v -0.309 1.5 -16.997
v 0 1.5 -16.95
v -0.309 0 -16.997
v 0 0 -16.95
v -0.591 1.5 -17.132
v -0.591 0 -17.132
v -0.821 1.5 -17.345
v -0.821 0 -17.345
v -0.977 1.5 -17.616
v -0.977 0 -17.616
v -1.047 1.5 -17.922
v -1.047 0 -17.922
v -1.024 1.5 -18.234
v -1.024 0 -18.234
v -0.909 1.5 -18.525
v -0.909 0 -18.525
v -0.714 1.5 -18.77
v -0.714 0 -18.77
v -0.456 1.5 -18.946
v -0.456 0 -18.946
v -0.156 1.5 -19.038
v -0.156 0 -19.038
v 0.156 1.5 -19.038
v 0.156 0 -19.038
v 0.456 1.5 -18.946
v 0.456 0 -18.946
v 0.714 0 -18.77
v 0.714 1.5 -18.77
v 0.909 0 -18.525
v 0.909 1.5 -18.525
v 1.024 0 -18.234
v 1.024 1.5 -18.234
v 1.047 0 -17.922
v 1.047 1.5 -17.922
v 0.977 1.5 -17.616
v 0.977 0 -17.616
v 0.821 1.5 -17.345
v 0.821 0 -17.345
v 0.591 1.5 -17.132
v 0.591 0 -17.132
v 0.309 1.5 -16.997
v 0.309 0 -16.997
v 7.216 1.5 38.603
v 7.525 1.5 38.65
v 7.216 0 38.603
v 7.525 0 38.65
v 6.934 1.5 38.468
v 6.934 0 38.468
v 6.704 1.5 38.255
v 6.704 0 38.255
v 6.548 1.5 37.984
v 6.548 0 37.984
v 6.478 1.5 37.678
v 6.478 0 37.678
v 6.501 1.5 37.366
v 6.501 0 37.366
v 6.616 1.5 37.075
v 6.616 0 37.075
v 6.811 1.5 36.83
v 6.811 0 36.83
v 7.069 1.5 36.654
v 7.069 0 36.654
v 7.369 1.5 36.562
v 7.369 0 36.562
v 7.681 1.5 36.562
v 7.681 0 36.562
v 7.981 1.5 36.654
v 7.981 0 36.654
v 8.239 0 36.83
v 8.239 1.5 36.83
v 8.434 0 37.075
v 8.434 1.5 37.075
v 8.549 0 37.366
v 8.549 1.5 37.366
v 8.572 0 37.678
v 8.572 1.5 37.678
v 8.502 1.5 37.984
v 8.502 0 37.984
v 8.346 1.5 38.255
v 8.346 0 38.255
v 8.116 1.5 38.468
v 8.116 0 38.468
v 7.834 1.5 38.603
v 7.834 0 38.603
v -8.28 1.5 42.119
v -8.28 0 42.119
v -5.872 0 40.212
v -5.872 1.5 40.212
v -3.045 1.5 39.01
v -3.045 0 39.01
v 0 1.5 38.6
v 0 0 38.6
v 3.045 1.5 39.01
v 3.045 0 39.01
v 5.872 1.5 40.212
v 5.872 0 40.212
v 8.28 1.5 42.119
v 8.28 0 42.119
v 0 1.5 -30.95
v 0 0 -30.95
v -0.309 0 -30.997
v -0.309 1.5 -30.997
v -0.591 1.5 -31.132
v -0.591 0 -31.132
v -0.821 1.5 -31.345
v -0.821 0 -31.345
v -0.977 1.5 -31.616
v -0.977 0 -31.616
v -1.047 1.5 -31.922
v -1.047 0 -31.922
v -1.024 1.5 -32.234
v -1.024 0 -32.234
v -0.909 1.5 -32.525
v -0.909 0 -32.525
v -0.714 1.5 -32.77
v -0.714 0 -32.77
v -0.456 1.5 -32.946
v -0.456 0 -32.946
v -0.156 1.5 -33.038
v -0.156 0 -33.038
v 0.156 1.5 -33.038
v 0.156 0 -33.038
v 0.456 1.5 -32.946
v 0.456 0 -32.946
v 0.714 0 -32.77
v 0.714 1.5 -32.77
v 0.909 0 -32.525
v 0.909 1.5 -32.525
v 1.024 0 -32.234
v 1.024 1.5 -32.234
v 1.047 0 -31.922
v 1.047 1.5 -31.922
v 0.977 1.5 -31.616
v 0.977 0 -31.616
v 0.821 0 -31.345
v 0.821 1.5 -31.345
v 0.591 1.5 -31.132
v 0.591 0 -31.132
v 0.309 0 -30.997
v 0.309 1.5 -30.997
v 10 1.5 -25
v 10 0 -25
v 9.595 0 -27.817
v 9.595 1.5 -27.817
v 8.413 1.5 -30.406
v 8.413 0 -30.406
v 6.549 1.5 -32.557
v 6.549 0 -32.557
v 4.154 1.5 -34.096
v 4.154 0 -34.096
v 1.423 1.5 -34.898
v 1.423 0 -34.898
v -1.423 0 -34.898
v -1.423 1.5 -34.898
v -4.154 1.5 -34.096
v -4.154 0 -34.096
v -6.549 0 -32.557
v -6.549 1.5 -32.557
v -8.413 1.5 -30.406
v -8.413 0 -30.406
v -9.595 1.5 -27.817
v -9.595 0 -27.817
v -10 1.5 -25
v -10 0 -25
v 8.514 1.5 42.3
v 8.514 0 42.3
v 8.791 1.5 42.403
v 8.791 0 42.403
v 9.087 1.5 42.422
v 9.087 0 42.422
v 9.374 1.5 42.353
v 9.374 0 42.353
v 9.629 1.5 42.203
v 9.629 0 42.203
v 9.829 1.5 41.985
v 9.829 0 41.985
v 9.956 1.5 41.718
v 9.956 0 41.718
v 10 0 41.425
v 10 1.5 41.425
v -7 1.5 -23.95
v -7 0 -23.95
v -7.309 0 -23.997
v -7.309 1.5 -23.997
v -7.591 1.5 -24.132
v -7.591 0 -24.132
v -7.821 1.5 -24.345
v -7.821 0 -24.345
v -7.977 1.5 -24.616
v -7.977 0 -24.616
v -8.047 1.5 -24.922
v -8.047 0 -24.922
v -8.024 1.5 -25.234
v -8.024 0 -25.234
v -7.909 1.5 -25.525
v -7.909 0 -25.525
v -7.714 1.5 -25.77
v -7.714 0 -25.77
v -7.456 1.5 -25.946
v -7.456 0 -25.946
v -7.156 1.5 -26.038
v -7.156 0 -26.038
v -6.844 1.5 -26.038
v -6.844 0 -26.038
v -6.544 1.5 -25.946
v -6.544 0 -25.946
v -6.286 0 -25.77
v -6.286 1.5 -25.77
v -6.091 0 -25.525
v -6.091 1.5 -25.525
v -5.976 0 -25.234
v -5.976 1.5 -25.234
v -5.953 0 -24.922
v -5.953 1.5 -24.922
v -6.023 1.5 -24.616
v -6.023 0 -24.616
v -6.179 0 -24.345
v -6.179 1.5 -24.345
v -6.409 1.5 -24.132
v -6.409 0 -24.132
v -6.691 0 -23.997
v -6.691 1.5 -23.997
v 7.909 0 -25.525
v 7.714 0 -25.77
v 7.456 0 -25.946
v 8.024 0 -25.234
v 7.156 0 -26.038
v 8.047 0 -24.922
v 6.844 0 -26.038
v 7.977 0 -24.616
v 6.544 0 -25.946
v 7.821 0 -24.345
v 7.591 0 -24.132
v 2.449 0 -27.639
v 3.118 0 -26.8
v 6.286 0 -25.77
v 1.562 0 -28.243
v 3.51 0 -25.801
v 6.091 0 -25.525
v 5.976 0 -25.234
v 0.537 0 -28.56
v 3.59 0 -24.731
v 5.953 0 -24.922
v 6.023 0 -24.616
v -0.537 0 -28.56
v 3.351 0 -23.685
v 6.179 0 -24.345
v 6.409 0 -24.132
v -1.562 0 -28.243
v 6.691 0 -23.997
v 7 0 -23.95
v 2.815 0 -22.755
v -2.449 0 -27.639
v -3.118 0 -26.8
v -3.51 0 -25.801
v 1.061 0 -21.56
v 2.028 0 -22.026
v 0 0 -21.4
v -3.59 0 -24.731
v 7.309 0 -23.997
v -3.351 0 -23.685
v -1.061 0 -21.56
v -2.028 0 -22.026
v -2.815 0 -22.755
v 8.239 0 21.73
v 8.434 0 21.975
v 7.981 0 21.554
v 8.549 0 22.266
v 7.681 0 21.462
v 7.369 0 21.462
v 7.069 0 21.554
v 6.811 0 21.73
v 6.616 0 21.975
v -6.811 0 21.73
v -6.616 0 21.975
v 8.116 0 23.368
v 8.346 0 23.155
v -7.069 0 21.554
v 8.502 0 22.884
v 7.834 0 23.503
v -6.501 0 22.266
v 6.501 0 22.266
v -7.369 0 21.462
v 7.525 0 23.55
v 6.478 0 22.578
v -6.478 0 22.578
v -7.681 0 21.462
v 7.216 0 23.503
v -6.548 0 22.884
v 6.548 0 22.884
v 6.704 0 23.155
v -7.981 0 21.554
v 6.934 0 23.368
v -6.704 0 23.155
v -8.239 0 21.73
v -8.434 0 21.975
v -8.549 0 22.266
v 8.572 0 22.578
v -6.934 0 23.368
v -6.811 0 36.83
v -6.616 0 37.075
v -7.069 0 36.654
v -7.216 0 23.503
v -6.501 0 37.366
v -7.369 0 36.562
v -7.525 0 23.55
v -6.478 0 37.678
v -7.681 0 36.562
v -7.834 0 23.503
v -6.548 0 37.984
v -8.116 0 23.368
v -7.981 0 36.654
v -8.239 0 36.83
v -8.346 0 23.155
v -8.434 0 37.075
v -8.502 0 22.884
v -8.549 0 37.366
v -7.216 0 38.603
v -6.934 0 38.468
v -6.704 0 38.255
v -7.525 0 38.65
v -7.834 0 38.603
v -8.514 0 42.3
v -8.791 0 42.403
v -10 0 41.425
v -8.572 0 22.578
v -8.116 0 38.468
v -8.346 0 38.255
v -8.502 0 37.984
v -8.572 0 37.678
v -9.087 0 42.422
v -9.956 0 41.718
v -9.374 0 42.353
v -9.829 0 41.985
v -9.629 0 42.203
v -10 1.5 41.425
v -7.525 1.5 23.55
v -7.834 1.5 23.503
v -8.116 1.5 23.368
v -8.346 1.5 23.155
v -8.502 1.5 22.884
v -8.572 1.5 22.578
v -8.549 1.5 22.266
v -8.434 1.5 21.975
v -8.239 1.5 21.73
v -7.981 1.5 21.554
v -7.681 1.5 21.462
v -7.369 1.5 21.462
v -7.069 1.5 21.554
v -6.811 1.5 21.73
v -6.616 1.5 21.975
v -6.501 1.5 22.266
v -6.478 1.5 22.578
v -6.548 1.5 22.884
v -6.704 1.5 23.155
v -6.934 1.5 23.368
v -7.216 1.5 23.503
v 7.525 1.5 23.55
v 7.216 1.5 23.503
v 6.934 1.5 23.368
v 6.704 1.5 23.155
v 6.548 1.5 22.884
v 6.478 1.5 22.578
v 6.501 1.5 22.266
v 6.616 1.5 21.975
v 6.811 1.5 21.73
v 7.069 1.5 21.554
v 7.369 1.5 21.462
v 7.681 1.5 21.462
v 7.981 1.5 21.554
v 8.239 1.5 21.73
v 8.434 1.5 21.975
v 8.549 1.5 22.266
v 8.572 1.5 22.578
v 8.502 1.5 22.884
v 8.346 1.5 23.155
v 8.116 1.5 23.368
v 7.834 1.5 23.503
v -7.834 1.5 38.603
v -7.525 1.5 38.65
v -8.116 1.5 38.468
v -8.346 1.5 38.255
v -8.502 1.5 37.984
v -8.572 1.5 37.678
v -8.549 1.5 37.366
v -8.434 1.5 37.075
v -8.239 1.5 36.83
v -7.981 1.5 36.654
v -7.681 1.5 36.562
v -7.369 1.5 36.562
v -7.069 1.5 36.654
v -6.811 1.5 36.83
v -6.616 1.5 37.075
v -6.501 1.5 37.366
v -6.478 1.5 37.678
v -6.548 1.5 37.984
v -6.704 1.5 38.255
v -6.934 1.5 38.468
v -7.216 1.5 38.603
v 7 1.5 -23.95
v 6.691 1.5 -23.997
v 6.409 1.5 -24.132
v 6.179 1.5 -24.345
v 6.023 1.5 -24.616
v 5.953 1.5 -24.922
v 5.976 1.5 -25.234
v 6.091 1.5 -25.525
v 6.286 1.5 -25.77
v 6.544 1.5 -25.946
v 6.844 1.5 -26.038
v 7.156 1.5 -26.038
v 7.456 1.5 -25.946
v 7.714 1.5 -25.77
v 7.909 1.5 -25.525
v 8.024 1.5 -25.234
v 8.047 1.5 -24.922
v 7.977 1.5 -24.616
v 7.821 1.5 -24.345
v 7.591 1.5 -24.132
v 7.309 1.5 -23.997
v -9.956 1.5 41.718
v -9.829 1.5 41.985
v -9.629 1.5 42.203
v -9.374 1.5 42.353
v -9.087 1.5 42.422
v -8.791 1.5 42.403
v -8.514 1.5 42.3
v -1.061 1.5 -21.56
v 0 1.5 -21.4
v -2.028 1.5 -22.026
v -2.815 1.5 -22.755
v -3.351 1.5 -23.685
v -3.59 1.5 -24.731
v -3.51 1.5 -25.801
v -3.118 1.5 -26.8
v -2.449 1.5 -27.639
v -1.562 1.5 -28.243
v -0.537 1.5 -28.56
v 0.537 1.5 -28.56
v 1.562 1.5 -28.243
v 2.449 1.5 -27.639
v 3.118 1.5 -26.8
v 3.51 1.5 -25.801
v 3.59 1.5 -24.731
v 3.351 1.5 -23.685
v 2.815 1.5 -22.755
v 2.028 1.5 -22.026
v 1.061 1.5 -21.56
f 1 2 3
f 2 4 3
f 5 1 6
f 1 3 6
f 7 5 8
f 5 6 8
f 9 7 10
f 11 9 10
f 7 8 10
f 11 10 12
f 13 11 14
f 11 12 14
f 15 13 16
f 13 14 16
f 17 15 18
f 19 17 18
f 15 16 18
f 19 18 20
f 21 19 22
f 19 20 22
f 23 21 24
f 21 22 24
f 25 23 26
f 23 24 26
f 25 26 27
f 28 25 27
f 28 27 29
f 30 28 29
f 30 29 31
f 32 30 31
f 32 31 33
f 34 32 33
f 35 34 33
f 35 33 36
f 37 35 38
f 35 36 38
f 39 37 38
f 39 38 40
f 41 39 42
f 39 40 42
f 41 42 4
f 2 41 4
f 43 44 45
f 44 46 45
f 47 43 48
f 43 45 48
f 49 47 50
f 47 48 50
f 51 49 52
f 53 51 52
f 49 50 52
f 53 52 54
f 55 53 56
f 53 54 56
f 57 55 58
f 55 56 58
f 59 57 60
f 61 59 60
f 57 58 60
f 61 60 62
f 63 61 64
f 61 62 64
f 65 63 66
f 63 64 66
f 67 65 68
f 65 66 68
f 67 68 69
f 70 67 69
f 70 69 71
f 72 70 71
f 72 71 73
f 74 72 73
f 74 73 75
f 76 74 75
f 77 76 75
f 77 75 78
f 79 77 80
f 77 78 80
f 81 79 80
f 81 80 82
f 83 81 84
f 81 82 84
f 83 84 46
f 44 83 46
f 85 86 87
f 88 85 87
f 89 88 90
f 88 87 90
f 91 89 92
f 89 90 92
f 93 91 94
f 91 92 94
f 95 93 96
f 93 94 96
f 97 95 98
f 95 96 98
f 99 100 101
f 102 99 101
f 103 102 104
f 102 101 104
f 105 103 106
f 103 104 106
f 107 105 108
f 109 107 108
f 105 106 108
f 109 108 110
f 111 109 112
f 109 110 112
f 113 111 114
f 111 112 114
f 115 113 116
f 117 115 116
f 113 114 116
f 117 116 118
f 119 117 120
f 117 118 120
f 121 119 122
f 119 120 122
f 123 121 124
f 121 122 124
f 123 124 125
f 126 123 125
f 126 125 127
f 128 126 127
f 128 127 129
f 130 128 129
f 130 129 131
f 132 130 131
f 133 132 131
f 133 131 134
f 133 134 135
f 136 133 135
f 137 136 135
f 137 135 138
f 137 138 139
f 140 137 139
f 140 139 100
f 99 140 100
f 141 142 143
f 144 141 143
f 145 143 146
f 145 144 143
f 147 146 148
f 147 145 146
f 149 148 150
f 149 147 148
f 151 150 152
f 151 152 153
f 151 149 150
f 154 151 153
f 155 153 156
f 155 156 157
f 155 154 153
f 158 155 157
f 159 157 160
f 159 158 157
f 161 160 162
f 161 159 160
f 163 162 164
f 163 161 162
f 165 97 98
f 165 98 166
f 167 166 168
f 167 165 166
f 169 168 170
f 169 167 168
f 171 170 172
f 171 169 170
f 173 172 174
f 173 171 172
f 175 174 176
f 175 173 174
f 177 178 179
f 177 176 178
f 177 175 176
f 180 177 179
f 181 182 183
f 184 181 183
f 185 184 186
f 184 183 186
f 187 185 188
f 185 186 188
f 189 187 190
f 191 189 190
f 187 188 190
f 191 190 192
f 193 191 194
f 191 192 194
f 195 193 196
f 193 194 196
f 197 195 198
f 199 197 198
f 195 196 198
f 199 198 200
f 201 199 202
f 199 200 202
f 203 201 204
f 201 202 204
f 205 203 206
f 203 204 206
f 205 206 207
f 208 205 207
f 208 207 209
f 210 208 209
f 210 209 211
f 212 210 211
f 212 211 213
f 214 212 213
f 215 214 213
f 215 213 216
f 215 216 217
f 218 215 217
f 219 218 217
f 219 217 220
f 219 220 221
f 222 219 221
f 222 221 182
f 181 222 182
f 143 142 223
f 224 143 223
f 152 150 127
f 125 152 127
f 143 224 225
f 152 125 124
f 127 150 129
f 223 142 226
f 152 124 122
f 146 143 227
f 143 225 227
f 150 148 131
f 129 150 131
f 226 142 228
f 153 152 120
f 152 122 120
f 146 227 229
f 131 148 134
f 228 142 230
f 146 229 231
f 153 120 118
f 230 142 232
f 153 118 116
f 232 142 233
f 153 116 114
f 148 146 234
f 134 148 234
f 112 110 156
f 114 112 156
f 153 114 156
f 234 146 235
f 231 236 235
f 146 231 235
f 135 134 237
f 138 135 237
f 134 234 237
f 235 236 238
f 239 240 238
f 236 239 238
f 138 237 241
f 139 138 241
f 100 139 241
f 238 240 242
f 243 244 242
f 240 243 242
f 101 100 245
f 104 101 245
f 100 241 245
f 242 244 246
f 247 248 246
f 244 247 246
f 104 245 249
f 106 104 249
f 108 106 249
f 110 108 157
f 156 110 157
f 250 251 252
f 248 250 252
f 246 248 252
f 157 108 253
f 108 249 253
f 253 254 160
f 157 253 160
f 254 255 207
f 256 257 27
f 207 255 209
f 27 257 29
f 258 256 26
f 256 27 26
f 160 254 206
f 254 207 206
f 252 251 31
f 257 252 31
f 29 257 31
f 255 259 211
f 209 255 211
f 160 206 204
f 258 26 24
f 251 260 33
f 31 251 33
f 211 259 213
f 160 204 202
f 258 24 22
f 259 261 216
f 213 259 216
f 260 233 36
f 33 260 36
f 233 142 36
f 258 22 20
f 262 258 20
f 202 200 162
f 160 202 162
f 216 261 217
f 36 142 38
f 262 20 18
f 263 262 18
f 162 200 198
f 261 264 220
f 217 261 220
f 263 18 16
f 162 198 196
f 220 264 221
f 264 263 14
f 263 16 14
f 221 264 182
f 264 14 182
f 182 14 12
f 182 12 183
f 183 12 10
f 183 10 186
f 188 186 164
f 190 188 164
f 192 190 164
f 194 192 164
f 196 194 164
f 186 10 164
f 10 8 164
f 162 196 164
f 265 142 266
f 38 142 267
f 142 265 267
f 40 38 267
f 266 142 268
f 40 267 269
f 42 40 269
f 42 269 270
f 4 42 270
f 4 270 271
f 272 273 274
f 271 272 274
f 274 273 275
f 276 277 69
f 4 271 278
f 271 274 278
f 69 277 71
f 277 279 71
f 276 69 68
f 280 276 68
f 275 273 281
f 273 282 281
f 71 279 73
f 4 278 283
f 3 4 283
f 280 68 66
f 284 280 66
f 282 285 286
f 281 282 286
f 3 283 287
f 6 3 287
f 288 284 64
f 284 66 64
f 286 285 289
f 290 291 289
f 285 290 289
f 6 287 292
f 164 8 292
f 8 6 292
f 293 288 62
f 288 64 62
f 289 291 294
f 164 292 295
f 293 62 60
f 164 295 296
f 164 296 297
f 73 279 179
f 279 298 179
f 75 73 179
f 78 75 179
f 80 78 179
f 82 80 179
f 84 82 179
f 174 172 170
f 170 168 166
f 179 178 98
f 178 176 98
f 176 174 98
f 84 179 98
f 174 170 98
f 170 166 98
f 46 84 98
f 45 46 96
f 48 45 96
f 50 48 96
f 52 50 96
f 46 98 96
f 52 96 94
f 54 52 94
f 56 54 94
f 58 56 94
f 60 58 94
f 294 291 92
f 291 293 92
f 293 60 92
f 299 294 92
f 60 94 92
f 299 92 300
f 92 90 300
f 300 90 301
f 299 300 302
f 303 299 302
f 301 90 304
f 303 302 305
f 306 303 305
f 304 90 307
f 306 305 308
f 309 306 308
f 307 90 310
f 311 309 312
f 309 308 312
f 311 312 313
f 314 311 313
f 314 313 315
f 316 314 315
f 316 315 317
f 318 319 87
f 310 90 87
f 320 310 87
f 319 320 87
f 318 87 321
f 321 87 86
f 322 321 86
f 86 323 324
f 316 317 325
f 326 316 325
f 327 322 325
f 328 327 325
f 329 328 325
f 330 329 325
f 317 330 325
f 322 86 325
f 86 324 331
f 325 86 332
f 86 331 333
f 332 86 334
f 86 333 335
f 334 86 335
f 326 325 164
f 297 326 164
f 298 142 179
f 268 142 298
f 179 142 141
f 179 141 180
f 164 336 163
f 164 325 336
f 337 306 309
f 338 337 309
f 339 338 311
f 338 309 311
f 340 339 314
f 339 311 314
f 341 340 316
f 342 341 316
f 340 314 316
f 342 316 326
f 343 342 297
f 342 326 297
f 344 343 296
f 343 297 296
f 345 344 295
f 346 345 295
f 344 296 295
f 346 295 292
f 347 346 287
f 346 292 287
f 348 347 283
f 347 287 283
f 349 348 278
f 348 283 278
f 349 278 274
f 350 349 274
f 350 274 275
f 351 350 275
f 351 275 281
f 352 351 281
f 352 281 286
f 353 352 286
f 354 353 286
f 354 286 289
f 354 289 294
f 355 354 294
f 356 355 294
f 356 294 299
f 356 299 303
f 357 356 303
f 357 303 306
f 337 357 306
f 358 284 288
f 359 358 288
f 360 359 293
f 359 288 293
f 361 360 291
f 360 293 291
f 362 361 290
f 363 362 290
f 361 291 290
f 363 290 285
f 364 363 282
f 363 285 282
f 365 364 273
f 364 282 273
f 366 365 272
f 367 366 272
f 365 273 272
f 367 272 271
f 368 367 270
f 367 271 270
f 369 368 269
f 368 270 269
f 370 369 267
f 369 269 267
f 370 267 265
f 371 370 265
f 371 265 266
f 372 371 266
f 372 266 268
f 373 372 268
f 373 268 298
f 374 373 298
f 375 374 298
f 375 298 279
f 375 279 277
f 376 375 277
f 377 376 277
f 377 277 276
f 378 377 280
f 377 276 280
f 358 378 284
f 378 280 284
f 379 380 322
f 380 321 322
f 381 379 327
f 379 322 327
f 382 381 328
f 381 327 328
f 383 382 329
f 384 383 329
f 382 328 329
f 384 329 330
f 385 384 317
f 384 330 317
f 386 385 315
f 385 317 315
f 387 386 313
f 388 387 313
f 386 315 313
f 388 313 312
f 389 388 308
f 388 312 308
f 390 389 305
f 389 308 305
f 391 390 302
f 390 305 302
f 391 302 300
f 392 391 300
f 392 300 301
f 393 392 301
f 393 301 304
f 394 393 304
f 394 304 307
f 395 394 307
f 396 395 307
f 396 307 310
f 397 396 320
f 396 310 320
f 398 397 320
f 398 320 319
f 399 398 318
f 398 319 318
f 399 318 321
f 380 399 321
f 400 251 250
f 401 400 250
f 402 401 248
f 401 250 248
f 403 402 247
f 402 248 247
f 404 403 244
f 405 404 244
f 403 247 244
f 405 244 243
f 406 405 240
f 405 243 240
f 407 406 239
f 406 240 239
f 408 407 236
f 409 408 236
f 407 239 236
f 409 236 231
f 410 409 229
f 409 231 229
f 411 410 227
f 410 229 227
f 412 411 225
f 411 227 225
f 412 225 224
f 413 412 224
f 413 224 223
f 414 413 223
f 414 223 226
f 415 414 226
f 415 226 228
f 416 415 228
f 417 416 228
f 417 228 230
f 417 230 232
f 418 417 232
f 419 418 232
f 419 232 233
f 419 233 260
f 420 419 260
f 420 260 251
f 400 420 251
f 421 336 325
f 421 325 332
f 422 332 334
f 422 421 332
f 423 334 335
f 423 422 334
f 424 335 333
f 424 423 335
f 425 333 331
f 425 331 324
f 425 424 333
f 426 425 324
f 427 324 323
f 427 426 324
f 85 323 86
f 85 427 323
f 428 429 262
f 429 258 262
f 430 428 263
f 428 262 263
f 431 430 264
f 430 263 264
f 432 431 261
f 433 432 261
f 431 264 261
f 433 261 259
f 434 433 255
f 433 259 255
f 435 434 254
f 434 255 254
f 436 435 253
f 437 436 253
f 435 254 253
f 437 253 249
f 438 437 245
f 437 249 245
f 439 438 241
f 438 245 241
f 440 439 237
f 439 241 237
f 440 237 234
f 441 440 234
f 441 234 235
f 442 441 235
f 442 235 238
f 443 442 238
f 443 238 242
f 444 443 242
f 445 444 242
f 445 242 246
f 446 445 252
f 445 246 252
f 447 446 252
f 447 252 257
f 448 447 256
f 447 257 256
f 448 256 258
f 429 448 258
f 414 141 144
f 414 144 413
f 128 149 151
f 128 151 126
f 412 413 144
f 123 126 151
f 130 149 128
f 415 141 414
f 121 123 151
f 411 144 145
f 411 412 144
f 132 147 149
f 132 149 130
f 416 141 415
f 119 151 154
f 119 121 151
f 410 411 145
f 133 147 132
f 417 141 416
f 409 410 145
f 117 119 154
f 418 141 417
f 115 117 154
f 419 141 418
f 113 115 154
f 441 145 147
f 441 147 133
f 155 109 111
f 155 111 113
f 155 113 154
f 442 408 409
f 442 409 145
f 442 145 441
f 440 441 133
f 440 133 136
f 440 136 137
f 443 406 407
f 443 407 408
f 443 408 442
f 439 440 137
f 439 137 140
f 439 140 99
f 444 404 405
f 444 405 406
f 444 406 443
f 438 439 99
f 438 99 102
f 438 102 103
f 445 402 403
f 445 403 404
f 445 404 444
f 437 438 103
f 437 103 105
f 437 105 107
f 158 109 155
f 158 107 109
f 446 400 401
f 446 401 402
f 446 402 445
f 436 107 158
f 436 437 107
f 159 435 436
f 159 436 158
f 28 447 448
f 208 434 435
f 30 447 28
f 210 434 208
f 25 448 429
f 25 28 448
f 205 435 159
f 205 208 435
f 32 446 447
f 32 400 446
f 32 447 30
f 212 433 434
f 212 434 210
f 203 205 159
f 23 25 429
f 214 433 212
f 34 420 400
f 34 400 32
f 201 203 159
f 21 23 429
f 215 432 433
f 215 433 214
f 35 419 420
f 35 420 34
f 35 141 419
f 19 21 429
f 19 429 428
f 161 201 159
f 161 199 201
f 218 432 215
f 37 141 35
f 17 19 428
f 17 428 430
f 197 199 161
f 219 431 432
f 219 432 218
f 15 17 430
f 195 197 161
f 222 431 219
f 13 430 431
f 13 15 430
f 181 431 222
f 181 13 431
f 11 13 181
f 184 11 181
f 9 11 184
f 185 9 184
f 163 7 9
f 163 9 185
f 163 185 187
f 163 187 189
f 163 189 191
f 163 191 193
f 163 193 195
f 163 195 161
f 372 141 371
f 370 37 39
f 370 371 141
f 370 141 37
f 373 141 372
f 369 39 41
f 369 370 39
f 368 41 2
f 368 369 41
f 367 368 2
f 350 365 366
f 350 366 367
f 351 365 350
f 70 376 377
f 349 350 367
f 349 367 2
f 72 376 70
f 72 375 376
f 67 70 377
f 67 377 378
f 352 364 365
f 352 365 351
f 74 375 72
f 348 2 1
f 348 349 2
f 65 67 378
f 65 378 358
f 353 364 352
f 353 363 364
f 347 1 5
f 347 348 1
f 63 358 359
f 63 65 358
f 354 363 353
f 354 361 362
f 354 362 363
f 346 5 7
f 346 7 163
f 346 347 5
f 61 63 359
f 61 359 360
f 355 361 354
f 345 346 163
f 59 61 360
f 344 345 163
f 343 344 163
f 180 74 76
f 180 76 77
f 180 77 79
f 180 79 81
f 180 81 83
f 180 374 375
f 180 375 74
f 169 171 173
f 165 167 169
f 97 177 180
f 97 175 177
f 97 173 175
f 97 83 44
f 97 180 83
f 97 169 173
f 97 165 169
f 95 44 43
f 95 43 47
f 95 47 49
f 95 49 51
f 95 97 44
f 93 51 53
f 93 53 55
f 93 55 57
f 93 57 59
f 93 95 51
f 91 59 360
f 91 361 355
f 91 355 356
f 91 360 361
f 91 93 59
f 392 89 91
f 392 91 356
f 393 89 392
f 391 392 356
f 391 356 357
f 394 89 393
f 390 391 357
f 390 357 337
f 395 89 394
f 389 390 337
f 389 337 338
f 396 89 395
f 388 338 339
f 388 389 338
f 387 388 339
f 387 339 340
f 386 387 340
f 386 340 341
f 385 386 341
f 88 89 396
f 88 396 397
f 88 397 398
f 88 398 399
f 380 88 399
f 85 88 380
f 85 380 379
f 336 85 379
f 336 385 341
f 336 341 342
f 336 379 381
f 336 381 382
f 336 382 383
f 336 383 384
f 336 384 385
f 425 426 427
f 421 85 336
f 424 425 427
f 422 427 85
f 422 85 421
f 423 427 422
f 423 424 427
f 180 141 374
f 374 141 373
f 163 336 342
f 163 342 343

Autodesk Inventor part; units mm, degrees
ref_plane "YZ Plane" through (0, 0, 0) normal (1, 0, 0) x (0, 1, 0)
ref_plane "XZ Plane" through (0, 0, 0) normal (0, 1, 0) x (-1, 0, 0)
ref_plane "XY Plane" through (0, 0, 0) normal (0, 0, 1) x (1, 0, 0)
sketch "Sketch1" plane through (0, 0, 0) normal (0, 1, 0) x (-1, 0, 0)
  line L0 (10, -35) -> (-10, -35)
  line L1 (-10, -35) -> (-10, 44.4211)
  line L2 (10, 44.4211) -> (10, -35)
  arc A0 (-10, 44.4211) -> (10, 44.4211) centre (0, 50.1) ccw
  point P0 (0, 0)
  dimension "d2" = 35
  dimension "d3" = 10
  dimension "d36" = 23
  dimension "d37" = 85.1
  dimension "d39" = 79.4211
  dimension "d40" = 20
extrude "Plate1" add sketch "Sketch1" along normal blind 1.5
sketch "Sketch3" plane through (0, 1.5, 0) normal (0, 1, 0) x (1, 0, 0)
  circle A0 centre (0, 25) radius 10
  circle A1 centre (0, -25) radius 10
  line L0 (-10, 35) -> (10, 35) projected
  line L1 (10, -44) -> (-10, -44) projected
  line L2 (-10, 35) -> (10, 35)
  line L3 (10, 35) -> (10, 25)
  line L4 (10, 25) -> (-10, 25)
  line L5 (-10, 25) -> (-10, 35)
  line L6 (10, -35) -> (-10, -35)
  line L7 (-10, -35) -> (-10, -25)
  line L8 (-10, -25) -> (10, -25)
  line L9 (10, -25) -> (10, -44)
  point P0 (0, 0)
  point P1 (-10, -44.4211)
  point P2 (10, -25)
  point P3 (0, -35)
  point P4 (-10, -35)
  point P5 (0, 35)
  point P6 (10, 35)
  dimension "d12" = 20
  dimension "d13" = 20
  dimension "d14" = 10
  dimension "d15" = 10
  dimension "d16" = 25
  dimension "d17" = 25
  dimension "d18" = 10
extrude "Extrusion1" cut sketch "Sketch3" against normal blind 10 contours L5 L0 A0 | A0 L0 L3
sketch "Sketch4" plane through (0, 1.5, 0) normal (0, 1, 0) x (1, 0, 0)
  circle A0 centre (-7, 25) radius 0.8
  arc A1 (10, 25) -> (-10, 25) centre (0, 25) ccw projected
  circle A2 centre (0, 18) radius 0.8
  circle A3 centre (7, 25) radius 0.8
  circle A4 centre (0, 32) radius 0.8
  point P0 (0, 0)
  dimension "d21" = 0
  dimension "d22" = 7
  dimension "d23" = 1.6
  dimension "d26" = 360
hole "Hole2" at (0, 1.5, -32) at (7, 1.5, -25) at (0, 1.5, -18) at (-7, 1.5, -25) direction (0, -1, 0) diameter 2.1 depth 1.5
fillet "Fillet1" radius 1 2 edges at (-10, 0.75, 44.4211) (10, 0.75, 44.4211)
sketch "Sketch5" plane through (0, 1.5, 0) normal (0, 1, 0) x (1, 0, 0)
  arc A0 (10, 25) -> (-10, 25) centre (0, 25) ccw projected
  point P0 (0, 0)
hole "Hole3" at (0, 1.5, -25) direction (0, -1, 0) diameter 7.2 depth 1.5
sketch "Sketch7" plane through (0, 1.5, 0) normal (0, 1, 0) x (1, 0, 0)
  circle A0 centre (7.525, -37.6) radius 1.05
  circle A1 centre (-7.525, -37.6) radius 1.05
  circle A2 centre (-7.525, -22.5) radius 1.05
  circle A3 centre (7.525, -22.5) radius 1.05
  point P0 (0, 0)
hole "Hole5" at (-7.525, 1.5, 22.5) at (7.525, 1.5, 22.5) at (7.525, 1.5, 37.6) at (-7.525, 1.5, 37.6) direction (0, -1, 0) diameter 2.1 end through all
equation "\"d33\" = Thickness"
equation "\"d47\" = Thickness"
equation "\"d61\" = Thickness"
equation "\"d4\" = Thickness"
equation "\"BendReliefWidth\" = Thickness"
equation "\"BendReliefDepth\" = 0.5 * Thickness"
equation "\"CornerReliefSize\" = 4 * Thickness"
equation "\"MinimumRemnant\" = 2 * Thickness"
equation "\"TransitionRadius\" = BendRadius"
equation "\"JacobiRadiusSize\" = BendRadius"
equation "\"GapSize\" = Thickness"
equation "\"Thickness\" = 1.5"
equation "\"BendRadius\" = 0.31"
properties part number "axis_8_10_connector_frame" material "Aluminum 6061-AHC"
